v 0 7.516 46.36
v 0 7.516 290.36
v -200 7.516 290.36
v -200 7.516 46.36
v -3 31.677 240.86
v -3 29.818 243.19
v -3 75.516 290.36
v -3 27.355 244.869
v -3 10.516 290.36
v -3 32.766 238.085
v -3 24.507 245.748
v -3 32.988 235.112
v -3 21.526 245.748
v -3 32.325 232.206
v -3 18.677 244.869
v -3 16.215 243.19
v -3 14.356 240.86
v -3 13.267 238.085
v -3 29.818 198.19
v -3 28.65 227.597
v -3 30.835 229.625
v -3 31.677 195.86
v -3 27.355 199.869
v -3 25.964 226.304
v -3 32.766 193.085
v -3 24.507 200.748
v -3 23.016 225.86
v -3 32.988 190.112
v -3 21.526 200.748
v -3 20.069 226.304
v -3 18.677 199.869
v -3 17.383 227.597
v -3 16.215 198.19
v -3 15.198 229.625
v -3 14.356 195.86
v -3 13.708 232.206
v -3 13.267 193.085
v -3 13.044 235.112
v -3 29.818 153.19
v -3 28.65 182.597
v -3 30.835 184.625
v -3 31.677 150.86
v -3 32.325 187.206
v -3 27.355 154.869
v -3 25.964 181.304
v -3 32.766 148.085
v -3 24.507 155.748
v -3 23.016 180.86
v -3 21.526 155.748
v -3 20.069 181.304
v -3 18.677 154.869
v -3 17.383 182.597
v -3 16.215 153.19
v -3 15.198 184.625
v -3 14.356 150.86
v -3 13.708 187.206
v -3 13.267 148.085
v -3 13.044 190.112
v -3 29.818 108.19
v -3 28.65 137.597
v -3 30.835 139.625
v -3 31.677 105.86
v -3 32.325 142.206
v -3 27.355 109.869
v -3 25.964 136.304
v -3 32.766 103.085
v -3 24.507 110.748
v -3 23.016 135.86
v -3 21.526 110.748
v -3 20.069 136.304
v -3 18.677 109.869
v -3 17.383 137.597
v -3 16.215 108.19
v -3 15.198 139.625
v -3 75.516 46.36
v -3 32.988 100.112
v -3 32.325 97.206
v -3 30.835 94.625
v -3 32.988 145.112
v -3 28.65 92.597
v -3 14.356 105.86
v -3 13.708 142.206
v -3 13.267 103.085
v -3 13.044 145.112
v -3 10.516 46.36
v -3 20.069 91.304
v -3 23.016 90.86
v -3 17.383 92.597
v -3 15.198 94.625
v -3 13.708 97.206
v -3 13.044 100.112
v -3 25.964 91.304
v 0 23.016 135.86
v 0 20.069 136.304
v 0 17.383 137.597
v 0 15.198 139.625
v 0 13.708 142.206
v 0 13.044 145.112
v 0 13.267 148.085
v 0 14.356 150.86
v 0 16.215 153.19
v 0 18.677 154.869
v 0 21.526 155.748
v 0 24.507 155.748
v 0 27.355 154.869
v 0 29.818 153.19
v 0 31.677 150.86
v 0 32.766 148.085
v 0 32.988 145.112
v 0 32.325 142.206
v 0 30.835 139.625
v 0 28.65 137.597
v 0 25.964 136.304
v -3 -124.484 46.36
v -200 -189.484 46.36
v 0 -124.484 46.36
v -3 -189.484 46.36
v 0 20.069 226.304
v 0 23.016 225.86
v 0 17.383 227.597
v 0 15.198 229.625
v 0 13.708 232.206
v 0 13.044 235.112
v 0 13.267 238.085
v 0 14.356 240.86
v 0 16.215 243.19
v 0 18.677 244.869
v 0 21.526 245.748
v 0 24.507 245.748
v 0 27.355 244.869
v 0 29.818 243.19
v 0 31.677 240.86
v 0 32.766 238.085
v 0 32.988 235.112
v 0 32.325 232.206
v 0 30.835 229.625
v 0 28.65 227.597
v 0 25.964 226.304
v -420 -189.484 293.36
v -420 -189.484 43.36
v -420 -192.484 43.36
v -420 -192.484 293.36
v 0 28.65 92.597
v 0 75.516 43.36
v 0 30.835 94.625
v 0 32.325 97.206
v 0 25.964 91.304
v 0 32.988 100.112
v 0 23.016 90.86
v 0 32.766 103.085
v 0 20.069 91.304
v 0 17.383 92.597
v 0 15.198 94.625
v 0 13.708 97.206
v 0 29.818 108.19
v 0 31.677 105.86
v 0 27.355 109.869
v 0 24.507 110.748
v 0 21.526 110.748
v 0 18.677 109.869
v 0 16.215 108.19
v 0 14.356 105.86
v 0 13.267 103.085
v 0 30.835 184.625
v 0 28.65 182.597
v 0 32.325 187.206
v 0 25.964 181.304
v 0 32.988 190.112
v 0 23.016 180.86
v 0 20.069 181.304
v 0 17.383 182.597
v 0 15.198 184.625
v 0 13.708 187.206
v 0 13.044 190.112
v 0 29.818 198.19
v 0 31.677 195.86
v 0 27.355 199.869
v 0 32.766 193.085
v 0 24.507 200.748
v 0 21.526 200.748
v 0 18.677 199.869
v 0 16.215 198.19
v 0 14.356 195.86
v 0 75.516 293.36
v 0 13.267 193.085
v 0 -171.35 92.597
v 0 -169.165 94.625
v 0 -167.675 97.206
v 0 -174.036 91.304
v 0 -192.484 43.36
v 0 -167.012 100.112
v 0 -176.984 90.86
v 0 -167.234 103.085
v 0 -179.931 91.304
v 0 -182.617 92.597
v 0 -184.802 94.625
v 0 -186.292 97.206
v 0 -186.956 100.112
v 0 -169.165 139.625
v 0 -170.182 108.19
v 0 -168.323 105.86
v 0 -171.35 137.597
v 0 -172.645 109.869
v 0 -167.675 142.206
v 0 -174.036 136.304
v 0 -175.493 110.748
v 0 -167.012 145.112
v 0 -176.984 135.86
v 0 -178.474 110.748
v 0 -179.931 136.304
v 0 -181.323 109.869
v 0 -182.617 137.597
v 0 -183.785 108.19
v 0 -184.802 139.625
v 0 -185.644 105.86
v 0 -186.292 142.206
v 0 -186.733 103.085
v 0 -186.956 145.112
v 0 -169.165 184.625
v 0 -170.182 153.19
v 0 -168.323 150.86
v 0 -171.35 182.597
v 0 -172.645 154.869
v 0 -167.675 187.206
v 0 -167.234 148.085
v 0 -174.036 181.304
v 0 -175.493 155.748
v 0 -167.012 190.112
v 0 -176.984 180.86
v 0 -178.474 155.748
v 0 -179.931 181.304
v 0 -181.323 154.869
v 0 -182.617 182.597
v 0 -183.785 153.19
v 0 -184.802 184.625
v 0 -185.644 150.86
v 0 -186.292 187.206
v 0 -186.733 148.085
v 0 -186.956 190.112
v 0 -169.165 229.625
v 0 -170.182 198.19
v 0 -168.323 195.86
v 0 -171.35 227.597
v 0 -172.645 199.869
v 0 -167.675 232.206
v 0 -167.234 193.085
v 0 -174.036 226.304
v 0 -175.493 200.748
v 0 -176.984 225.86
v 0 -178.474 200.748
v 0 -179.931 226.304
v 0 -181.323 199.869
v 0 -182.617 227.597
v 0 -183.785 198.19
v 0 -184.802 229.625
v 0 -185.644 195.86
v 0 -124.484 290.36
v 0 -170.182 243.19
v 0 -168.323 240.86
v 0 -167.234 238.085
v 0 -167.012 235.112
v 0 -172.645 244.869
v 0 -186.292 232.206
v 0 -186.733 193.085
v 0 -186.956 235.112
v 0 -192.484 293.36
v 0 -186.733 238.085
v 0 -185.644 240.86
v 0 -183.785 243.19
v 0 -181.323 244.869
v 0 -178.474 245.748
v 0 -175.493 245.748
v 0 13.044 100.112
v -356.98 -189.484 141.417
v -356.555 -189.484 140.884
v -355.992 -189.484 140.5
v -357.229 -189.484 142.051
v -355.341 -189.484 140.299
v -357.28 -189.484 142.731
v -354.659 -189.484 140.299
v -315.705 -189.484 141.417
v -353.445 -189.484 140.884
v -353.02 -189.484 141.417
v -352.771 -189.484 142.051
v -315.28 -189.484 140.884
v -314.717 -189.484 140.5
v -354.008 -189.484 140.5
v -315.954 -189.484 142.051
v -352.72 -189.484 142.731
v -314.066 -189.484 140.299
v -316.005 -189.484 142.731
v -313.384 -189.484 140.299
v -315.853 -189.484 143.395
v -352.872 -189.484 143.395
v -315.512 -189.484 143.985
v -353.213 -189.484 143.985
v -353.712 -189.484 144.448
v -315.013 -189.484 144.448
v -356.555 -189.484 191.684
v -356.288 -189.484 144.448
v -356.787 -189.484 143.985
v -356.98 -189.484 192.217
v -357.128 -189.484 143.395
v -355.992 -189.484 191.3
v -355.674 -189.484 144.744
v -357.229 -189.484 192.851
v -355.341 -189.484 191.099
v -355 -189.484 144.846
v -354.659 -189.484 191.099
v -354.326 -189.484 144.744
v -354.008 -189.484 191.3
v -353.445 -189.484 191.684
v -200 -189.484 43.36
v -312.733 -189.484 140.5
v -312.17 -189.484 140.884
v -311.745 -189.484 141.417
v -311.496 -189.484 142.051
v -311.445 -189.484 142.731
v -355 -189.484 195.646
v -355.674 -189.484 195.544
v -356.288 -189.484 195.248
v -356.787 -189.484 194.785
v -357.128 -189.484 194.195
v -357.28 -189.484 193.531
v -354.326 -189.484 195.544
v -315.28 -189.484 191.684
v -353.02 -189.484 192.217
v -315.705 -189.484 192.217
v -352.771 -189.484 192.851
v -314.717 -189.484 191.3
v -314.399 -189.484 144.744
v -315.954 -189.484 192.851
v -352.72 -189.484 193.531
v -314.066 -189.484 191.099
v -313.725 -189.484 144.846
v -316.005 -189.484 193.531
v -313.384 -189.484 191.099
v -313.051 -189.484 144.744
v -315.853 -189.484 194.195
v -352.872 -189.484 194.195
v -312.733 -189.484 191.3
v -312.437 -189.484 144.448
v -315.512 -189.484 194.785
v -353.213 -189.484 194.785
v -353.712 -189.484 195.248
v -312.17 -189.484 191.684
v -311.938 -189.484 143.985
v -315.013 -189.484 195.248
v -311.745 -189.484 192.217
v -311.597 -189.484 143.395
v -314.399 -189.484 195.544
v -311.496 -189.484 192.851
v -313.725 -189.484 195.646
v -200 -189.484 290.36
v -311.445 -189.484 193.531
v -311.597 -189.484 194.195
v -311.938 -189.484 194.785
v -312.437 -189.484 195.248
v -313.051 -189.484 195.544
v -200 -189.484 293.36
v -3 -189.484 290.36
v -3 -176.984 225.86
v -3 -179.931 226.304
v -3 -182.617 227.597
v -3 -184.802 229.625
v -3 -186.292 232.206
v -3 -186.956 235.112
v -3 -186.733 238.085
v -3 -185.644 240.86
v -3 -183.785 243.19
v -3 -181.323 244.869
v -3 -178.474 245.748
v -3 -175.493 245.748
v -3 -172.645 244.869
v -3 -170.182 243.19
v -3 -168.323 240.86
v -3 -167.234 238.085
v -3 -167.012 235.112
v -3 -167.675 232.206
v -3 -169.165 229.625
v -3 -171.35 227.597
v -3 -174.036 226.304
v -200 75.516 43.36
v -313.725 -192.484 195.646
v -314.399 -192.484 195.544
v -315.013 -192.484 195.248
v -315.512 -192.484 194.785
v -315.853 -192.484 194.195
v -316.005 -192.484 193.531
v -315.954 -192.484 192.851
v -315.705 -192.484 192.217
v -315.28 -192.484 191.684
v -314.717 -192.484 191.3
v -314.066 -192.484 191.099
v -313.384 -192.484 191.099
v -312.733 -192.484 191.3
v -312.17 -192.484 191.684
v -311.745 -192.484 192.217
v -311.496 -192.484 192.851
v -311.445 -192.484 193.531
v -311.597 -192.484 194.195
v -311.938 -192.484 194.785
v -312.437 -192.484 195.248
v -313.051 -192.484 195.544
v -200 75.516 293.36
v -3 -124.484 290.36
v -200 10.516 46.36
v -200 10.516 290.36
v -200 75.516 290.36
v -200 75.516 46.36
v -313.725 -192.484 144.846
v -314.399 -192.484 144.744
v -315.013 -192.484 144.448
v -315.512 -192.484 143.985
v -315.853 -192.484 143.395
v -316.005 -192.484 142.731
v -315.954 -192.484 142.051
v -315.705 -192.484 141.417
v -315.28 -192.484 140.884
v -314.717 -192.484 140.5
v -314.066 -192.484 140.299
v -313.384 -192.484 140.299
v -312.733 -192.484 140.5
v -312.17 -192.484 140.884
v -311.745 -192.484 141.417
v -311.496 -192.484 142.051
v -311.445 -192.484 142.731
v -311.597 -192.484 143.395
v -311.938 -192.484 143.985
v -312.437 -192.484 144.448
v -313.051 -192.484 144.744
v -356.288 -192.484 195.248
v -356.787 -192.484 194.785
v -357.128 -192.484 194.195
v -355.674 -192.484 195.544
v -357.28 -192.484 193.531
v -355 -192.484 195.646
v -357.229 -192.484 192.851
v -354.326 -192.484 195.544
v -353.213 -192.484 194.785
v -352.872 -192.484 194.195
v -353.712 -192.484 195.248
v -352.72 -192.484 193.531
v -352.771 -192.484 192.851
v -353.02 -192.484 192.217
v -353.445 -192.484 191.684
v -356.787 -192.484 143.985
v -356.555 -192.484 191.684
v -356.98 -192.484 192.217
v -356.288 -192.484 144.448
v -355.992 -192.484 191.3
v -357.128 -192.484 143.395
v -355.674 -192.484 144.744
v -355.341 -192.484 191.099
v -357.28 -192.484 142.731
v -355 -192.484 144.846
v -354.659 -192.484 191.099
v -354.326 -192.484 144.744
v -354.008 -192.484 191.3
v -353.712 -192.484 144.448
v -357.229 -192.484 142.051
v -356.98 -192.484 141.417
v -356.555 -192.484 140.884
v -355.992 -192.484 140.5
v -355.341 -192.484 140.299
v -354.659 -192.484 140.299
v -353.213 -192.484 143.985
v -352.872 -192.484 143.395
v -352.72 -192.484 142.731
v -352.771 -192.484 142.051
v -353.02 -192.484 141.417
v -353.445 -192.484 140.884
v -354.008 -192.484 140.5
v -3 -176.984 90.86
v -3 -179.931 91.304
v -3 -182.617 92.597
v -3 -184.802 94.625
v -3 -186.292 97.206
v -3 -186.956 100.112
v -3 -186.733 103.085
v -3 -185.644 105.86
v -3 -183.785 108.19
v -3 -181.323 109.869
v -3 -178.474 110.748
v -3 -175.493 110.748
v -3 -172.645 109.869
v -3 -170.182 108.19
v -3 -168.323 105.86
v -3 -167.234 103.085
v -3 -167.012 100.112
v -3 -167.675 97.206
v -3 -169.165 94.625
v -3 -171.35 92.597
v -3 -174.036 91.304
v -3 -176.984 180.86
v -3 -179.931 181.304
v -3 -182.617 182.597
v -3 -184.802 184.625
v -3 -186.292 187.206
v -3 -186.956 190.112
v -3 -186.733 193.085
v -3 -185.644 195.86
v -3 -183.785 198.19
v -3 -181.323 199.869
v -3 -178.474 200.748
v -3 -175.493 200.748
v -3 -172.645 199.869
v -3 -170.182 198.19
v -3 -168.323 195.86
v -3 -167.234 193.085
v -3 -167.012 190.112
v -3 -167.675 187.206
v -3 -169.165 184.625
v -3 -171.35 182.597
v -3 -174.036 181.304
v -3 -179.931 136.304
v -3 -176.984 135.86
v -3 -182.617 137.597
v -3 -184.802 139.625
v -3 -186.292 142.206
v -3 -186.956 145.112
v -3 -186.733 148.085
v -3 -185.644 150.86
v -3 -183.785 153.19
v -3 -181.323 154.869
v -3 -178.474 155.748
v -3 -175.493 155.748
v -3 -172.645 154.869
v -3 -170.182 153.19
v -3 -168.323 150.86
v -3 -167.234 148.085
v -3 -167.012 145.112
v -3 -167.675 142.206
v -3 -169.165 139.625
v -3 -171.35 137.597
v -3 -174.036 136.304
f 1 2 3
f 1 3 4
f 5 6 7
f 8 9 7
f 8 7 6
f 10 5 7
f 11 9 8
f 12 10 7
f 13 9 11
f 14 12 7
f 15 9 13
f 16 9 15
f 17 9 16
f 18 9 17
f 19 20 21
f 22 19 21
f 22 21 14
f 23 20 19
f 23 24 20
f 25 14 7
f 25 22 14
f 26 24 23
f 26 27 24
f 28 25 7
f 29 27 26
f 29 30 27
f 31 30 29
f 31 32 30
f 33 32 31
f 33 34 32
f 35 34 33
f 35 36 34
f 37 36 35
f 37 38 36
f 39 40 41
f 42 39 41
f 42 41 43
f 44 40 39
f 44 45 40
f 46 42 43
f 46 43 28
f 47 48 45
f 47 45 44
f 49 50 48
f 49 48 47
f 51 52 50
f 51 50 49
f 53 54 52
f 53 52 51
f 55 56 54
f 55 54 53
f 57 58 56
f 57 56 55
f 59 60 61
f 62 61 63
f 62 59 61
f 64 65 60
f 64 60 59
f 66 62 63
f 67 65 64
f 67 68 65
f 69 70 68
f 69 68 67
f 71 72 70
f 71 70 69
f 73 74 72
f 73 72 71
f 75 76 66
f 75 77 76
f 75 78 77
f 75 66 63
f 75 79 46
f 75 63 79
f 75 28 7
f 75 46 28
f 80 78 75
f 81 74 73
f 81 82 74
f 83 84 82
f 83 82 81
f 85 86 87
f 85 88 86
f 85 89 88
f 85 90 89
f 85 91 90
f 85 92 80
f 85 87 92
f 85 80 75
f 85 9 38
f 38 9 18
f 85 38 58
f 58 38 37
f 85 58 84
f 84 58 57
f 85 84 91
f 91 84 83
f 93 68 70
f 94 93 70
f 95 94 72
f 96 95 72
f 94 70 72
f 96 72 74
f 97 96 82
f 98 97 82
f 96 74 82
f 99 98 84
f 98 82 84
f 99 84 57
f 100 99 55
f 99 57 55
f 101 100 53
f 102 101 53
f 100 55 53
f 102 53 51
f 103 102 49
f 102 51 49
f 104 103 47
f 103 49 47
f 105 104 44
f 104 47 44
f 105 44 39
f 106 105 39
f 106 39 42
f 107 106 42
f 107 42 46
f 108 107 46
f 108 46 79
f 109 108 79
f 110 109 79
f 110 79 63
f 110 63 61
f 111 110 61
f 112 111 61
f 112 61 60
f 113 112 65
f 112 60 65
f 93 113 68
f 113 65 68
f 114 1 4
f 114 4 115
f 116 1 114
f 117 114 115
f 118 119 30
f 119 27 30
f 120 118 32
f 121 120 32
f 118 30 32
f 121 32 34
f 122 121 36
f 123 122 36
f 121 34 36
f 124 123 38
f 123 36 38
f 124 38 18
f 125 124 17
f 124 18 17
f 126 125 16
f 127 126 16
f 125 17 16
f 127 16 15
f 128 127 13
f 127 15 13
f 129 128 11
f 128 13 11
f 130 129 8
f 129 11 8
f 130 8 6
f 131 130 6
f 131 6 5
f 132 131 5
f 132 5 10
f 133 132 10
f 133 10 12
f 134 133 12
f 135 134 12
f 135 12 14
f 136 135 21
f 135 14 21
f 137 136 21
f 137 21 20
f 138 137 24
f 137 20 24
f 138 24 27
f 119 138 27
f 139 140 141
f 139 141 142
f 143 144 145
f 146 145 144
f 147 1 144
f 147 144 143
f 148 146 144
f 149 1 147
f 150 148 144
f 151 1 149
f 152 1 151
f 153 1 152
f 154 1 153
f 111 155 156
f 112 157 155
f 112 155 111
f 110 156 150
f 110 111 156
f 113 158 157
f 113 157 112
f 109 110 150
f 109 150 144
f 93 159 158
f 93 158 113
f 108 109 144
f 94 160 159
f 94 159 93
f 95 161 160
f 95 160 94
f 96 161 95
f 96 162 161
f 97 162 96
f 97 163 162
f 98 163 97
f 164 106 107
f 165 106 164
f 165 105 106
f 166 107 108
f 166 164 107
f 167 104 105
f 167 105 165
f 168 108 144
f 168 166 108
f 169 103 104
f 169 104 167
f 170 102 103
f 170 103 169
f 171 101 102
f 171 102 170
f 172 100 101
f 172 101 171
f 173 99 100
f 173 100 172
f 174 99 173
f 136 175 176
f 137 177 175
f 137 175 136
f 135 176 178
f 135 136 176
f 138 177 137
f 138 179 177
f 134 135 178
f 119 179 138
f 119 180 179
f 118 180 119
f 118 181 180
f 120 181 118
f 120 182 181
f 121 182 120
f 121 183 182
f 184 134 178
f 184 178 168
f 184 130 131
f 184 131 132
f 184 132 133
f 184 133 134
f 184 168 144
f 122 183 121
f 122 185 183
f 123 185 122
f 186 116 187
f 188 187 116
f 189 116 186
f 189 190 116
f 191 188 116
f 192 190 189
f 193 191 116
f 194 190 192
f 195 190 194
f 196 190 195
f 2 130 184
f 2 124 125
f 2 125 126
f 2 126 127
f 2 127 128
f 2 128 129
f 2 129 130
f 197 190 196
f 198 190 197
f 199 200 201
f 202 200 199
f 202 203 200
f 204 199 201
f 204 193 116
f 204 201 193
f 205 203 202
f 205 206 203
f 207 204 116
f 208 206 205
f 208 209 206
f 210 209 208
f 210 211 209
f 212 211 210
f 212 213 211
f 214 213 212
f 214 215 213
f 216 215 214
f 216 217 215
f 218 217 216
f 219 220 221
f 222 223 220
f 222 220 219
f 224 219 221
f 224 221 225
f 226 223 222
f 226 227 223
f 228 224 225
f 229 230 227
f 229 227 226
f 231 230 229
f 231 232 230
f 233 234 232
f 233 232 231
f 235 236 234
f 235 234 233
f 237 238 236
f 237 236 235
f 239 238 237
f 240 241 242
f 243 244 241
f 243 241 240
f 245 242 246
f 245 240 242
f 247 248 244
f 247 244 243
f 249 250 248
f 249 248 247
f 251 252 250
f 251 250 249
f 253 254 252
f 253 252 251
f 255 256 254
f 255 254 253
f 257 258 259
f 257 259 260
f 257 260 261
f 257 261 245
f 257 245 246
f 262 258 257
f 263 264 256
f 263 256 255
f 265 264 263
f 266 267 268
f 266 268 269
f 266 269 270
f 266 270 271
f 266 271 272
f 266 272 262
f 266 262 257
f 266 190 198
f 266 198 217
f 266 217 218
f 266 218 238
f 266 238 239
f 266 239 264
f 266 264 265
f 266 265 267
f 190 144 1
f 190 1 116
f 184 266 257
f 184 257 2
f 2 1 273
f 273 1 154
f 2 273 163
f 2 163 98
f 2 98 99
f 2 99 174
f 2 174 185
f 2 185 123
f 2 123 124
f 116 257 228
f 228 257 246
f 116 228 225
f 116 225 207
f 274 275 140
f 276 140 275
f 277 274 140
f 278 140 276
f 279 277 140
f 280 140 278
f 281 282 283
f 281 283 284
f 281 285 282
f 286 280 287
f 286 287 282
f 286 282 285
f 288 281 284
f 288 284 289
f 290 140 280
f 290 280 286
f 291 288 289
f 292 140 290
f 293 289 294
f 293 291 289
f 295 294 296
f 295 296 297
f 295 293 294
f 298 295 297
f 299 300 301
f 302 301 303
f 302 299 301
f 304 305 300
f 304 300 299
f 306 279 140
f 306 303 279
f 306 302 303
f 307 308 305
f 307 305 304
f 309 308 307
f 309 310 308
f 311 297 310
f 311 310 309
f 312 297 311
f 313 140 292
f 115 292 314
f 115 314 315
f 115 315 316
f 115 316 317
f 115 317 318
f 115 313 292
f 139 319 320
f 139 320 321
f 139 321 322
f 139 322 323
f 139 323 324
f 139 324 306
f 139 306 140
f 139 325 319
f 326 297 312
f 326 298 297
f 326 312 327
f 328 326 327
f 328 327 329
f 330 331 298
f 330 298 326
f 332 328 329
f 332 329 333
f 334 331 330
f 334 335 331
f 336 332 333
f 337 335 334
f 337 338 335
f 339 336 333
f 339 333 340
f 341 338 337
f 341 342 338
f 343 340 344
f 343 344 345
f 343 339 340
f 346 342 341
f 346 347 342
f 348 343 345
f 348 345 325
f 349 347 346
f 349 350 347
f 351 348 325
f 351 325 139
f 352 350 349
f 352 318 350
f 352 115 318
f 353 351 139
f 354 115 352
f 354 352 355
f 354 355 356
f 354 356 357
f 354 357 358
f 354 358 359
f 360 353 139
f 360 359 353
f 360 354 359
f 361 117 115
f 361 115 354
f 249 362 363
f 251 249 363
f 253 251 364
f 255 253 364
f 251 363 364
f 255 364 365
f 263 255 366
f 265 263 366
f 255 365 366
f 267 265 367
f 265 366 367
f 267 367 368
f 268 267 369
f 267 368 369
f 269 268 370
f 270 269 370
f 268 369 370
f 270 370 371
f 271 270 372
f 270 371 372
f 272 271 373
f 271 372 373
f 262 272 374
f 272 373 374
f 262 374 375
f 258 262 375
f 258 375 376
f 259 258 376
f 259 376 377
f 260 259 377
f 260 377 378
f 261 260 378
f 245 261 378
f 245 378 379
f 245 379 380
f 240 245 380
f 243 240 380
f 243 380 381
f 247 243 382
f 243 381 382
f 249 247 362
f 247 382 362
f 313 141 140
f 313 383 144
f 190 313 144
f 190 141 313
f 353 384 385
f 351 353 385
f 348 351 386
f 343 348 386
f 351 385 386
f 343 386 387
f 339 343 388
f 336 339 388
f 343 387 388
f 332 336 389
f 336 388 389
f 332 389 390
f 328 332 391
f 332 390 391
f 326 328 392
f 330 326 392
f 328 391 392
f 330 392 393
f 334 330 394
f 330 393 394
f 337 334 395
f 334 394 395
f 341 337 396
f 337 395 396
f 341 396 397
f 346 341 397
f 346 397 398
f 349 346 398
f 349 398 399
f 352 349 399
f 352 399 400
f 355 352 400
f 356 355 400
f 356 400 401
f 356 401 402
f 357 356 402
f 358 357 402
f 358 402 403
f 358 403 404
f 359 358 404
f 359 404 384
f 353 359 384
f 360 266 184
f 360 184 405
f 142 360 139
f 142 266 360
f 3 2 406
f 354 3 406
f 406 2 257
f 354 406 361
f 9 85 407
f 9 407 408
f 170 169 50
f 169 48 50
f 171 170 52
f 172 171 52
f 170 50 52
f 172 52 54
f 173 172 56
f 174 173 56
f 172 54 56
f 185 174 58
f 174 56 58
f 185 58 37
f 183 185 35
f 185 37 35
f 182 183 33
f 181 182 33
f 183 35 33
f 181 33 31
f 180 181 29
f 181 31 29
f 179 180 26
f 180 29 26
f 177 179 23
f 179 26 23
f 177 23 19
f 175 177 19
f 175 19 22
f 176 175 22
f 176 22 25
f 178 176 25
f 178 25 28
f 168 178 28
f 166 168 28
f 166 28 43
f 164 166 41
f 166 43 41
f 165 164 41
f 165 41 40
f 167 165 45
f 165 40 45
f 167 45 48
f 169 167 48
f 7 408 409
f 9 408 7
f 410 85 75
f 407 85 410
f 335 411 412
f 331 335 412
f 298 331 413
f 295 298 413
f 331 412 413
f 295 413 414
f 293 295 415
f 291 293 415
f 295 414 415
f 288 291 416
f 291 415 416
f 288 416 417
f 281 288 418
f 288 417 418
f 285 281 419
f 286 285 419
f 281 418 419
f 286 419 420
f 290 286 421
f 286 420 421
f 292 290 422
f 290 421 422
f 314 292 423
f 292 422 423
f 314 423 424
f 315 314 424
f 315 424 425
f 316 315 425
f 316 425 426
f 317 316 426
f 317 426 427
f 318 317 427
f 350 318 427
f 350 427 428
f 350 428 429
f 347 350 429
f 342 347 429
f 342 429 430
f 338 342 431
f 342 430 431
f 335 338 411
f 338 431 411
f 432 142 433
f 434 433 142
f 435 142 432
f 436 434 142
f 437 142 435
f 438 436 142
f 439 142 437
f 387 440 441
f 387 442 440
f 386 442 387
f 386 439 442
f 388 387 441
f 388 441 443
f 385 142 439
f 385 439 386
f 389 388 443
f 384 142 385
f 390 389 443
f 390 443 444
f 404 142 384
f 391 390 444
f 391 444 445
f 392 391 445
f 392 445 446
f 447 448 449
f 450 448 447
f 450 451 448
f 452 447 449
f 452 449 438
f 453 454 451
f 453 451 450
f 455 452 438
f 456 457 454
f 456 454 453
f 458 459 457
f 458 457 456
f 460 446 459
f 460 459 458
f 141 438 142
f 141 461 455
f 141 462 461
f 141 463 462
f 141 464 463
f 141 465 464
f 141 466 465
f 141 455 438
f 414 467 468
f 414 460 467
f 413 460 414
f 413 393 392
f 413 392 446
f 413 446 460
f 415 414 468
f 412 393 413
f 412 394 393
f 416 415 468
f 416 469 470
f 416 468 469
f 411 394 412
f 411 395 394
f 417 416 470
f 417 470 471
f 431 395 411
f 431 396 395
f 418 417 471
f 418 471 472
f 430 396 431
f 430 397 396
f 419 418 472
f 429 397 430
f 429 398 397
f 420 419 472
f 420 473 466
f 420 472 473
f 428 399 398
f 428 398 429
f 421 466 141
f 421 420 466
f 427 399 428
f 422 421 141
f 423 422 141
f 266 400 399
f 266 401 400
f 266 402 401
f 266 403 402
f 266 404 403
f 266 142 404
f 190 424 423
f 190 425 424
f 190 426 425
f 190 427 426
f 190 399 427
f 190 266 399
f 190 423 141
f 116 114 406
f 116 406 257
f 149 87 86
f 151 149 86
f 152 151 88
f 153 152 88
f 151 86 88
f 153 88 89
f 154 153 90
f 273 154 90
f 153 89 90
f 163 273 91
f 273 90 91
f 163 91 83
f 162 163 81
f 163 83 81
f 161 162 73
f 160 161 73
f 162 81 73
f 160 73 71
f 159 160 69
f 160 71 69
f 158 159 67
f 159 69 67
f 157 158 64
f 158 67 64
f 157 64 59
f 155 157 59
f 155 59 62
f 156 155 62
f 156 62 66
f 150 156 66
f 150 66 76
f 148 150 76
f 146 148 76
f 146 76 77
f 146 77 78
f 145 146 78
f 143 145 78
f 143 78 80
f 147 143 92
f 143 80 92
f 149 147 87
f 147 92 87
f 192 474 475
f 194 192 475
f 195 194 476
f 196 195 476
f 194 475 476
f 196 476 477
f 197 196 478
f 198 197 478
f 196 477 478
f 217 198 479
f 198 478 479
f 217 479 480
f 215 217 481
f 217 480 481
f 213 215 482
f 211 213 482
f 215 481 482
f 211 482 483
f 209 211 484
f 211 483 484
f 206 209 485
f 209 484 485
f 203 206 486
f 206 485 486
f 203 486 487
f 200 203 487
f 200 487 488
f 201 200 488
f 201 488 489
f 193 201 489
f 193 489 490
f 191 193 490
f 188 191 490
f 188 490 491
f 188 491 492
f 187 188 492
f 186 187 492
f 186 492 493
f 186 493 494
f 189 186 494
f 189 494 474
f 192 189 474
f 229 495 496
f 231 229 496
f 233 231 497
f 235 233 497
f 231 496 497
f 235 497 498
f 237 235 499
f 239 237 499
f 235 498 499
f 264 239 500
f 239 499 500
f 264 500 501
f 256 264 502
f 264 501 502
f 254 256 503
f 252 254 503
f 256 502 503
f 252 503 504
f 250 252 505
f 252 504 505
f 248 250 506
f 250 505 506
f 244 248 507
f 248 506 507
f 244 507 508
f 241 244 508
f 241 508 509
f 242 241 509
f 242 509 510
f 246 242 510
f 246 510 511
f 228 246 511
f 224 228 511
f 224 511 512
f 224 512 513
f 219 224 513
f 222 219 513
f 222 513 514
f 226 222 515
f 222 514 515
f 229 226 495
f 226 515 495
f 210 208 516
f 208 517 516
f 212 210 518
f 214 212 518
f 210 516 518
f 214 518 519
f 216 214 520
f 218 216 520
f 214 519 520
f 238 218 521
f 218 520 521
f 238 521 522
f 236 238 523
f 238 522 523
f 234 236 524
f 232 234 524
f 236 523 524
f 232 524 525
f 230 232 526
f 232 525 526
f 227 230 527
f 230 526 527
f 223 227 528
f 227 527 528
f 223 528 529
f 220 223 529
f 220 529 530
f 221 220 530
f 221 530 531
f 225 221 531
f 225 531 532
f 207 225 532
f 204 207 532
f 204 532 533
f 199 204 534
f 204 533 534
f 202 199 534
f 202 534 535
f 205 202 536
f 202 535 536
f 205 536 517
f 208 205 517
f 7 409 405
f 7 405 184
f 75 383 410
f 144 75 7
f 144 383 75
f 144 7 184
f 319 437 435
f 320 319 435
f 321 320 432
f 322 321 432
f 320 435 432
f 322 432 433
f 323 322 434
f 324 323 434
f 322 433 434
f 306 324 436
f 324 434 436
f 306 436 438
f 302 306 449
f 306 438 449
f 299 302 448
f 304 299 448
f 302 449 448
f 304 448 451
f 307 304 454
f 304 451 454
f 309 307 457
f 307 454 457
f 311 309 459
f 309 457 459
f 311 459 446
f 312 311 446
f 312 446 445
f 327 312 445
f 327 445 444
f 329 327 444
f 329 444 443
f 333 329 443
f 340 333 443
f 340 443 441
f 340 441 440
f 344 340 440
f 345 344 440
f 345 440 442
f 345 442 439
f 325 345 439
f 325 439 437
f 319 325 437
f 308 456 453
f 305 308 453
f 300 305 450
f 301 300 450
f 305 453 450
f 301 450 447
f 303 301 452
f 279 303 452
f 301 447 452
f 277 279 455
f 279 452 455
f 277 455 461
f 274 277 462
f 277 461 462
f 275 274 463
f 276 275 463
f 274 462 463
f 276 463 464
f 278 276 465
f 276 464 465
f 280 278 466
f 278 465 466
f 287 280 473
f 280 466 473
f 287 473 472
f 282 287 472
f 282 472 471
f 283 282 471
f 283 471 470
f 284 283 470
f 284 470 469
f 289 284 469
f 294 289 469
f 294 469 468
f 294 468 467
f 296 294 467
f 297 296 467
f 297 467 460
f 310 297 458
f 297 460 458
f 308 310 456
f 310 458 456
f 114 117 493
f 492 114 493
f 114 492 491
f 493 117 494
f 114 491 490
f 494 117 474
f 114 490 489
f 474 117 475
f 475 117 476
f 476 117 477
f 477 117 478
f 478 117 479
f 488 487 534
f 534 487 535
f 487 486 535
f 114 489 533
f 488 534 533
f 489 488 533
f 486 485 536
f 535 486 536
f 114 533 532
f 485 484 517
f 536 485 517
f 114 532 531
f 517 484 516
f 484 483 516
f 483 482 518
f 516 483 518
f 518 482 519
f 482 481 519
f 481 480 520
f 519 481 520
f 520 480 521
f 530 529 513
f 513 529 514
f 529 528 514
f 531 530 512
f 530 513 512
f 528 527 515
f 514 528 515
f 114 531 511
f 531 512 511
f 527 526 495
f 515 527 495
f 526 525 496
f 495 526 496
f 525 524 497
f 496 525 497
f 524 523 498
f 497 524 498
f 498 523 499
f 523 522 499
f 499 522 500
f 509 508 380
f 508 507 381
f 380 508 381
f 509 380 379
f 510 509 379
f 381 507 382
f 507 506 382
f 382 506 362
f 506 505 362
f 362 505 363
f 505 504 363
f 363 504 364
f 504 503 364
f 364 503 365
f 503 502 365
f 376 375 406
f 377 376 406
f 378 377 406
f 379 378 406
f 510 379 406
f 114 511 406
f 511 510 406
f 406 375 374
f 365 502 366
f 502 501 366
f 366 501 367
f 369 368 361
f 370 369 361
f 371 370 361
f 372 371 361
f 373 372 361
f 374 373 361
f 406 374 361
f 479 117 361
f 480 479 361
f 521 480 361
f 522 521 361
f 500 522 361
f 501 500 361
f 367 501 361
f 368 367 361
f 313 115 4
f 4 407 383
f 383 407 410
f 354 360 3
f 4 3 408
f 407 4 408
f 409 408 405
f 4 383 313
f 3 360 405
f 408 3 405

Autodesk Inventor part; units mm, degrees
ref_plane "YZ Plane" through (0, 0, 0) normal (1, 0, 0) x (0, 1, 0)
ref_plane "XZ Plane" through (0, 0, 0) normal (0, 1, 0) x (-1, 0, 0)
ref_plane "XY Plane" through (0, 0, 0) normal (0, 0, 1) x (1, 0, 0)
sketch "Sketch1" plane through (0, 0, 0) normal (1, 0, 0) x (0, 1, 0)
  line L0 (10.5163, 293.3597) -> (7.5163, 293.3597)
  line L1 (7.5163, 293.3597) -> (7.5163, 43.3597)
  line L2 (7.5163, 43.3597) -> (10.5163, 43.3597)
  line L3 (10.5163, 43.3597) -> (10.5163, 293.3597)
  line L4 (10.5163, 293.3597) -> (7.5163, 43.3597) construction
  line L5 (7.5163, 293.3597) -> (10.5163, 43.3597) construction
  line L6 (7.5163, 46.3597) -> (-192.4837, 46.3597)
  line L7 (-192.4837, 46.3597) -> (-192.4837, 43.3597)
  line L8 (-192.4837, 43.3597) -> (7.5163, 43.3597)
  line L9 (7.5163, 43.3597) -> (7.5163, 46.3597)
  line L10 (7.5163, 46.3597) -> (-192.4837, 43.3597) construction
  line L11 (-192.4837, 46.3597) -> (7.5163, 43.3597) construction
  line L12 (7.5163, 168.3597) -> (-42.4837, 168.3597)
  line L13 (7.5163, 168.3597) -> (57.5163, 168.3597) construction
  line L14 (7.5163, 290.3597) -> (-192.4837, 290.3597)
  line L15 (-192.4837, 290.3597) -> (-192.4837, 293.3597)
  line L16 (-192.4837, 293.3597) -> (7.5163, 293.3597)
  line L17 (7.5163, 290.3597) -> (-192.4837, 293.3597) construction
  line L18 (-192.4837, 290.3597) -> (7.5163, 293.3597) construction
  line L19 (-189.4837, 290.3597) -> (-192.4837, 290.3597)
  line L20 (-192.4837, 290.3597) -> (-192.4837, 46.3597)
  line L21 (-192.4837, 46.3597) -> (-189.4837, 46.3597)
  line L22 (-189.4837, 46.3597) -> (-189.4837, 290.3597)
  line L23 (-189.4837, 290.3597) -> (-192.4837, 46.3597) construction
  line L24 (-192.4837, 290.3597) -> (-189.4837, 46.3597) construction
  point P0 (0, 0)
  point P1 (9.0163, 168.3597)
  point P2 (-92.4837, 44.8597)
  point P3 (-92.4837, 291.8597)
  point P4 (-189.2359, -83.872)
  point P5 (7.5163, 290.3597)
  point P6 (7.5163, 46.3597)
  point P7 (-190.9837, 168.3597)
  point P8 (-189.4837, 46.3597)
  point P9 (-189.4837, 290.3597)
  dimension "d0" = 3
  dimension "d1" = 250
  dimension "d2" = 200
  dimension "d3" = 3
  dimension "d4" = 50
  dimension "d5" = 180
  dimension "d19" = 244
extrude "Extrusion1" add sketch "Sketch1" against normal blind 200 contours L3 L2 L1 L0 | L1 L14 L15 L16 | L8 L7 L6 L1 | L22 L6 L20 L14
sketch "Sketch3" plane through (-200, 0, 0) normal (-1, 0, 0) x (0, 0, 1)
  line L0 (43.3597, -189.4837) -> (293.3597, -189.4837)
  line L1 (293.3597, -189.4837) -> (293.3597, -192.4837)
  line L2 (293.3597, -192.4837) -> (43.3597, -192.4837)
  line L3 (43.3597, -192.4837) -> (43.3597, -189.4837)
  line L4 (43.3597, -189.4837) -> (293.3597, -192.4837) construction
  line L5 (293.3597, -189.4837) -> (43.3597, -192.4837) construction
  line L6 (46.3597, -189.4837) -> (290.3597, -189.4837) projected
  line L7 (290.3597, -189.4837) -> (46.3597, -189.4837)
  line L8 (290.3597, -189.4837) -> (534.3597, -189.4837) construction
  point P0 (0, 0)
  point P1 (168.3597, -190.9837)
  point P2 (168.3597, -189.4837)
  dimension "d20" = 250
  dimension "d21" = 3
  dimension "d22" = 244
  dimension "d23" = 180
extrude "Extrusion3" add sketch "Sketch3" along normal blind 220
sketch "Sketch7" plane through (0, -189.4837, 290.3597) normal (0, 1, 0) x (1, 0, 0)
  line L0 (-200, 247) -> (-420, 247) projected
  line L1 (-200, -3) -> (-420, -3) projected
  line L2 (-420, -3) -> (-420, 247) projected
  point P0 (0, 290.3597)
  point P1 (-355, 97)
  point P2 (-355, 147.8)
  point P3 (-313.725, 147.8)
  point P4 (-313.725, 97)
  point P5 (-200, 244)
  point P6 (-200, 0)
  point P7 (-350, 369)
  point P8 (-350, -125)
  dimension "d53" = 50.8
  dimension "d54" = 50.8
  dimension "d55" = 41.275
  dimension "d56" = 41.275
  dimension "d59" = 100
  dimension "d60" = 100
  dimension "d61" = 65
  dimension "d62" = 65
hole "Hole1" at (-355, -189.4837, 193.3597) at (-355, -189.4837, 142.5597) at (-313.725, -189.4837, 142.5597) at (-313.725, -189.4837, 193.3597) direction (0, -1, 0) diameter 4.572 depth 26 tip angle 118
sketch "Sketch8" plane through (0, 10.5163, 293.3597) normal (0, 1, 0) x (1, 0, 0)
  line L0 (-3, 250) -> (0, 250)
  line L1 (0, 250) -> (0, 0)
  line L2 (0, 0) -> (-3, 0)
  line L3 (-3, 0) -> (-3, 250)
  line L4 (-3, 250) -> (0, 0) construction
  line L5 (0, 250) -> (-3, 0) construction
  line L6 (0, 250) -> (0, 0) projected
  line L7 (-200, 250) -> (-3, 250)
  line L8 (-3, 250) -> (-3, 247)
  line L9 (-3, 247) -> (-200, 247)
  line L10 (-200, 247) -> (-200, 250)
  line L11 (-200, 250) -> (-3, 247) construction
  line L12 (-3, 250) -> (-200, 247) construction
  line L13 (-200, 3) -> (-3, 3)
  line L14 (-3, 3) -> (-3, 0)
  line L15 (-3, 0) -> (-200, 0)
  line L16 (-200, 0) -> (-200, 3)
  line L17 (-200, 3) -> (-3, 0) construction
  line L18 (-3, 3) -> (-200, 0) construction
  point P0 (0, 293.3597)
  point P1 (-1.5, 125)
  point P2 (0, 125)
  point P3 (-101.5, 248.5)
  point P4 (-101.5, 1.5)
  point P5 (-3, 3)
  dimension "d63" = 3
  dimension "d64" = 250
  dimension "d82" = 197
  dimension "d83" = 3
  dimension "d84" = 197
  dimension "d85" = 3
extrude "Extrusion7" add sketch "Sketch8" along normal blind 65 contours L0 L1 L2 L3
sketch "Sketch9" plane through (0, 0, 0) normal (1, 0, 0) x (0, 0, -1)
  line L0 (-293.3597, 10.5163) -> (-43.3597, 10.5163) projected
  line L1 (-293.3597, 75.5163) -> (-293.3597, -192.4837) projected
  point P0 (0, 0)
  point P1 (-235.8597, 23.0163)
  point P2 (-190.8597, 23.0163)
  point P3 (-145.8597, 23.0163)
  point P4 (-100.8597, 23.0163)
  dimension "d74" = 12.5
  dimension "d75" = 12.5
  dimension "d76" = 12.5
  dimension "d77" = 12.5
  dimension "d78" = 45
  dimension "d79" = 45
  dimension "d80" = 45
  dimension "d81" = 57.5
hole "Hole2" at (0, 23.0163, 235.8597) at (0, 23.0163, 190.8597) at (0, 23.0163, 145.8597) at (0, 23.0163, 100.8597) direction (-1, 0, 0) diameter 20 depth 26 tip angle 118
extrude "Extrusion8" add sketch "Sketch8" along normal blind 65 contours L3 L9 L10 L7 | L3 L15 L16 L13
sketch "Sketch10" plane through (0, -189.4837, 290.3597) normal (0, 1, 0) x (1, 0, 0)
  line L0 (-3, 0) -> (0, 0)
  line L1 (0, 0) -> (0, 244)
  line L2 (0, 244) -> (-3, 244)
  line L3 (-3, 244) -> (-3, 0)
  line L4 (-3, 0) -> (0, 244) construction
  line L5 (0, 0) -> (-3, 244) construction
  line L6 (0, 244) -> (0, 0) projected
  point P0 (0, 290.3597)
  point P1 (-1.5, 122)
  point P2 (0, 122)
  dimension "d89" = 3
  dimension "d90" = 244
extrude "Extrusion9" add sketch "Sketch10" along normal blind 65
sketch "Sketch11" plane through (0, 0, 0) normal (1, 0, 0) x (0, 0, -1)
  line L0 (-290.3597, -189.4837) -> (-46.3597, -189.4837) projected
  line L1 (-293.3597, 75.5163) -> (-293.3597, -192.4837) projected
  point P0 (0, 0)
  point P1 (-235.8597, -176.9837)
  point P2 (-190.8597, -176.9837)
  point P3 (-145.8597, -176.9837)
  point P4 (-100.8597, -176.9837)
  dimension "d100" = 12.5
  dimension "d101" = 12.5
  dimension "d102" = 12.5
  dimension "d103" = 12.5
  dimension "d104" = 57.5
  dimension "d105" = 45
  dimension "d106" = 45
  dimension "d107" = 45
hole "Hole3" at (0, -176.9837, 235.8597) at (0, -176.9837, 190.8597) at (0, -176.9837, 145.8597) at (0, -176.9837, 100.8597) direction (-1, 0, 0) diameter 20 depth 26 tip angle 118
properties part number "Valves_Pump Holder"
